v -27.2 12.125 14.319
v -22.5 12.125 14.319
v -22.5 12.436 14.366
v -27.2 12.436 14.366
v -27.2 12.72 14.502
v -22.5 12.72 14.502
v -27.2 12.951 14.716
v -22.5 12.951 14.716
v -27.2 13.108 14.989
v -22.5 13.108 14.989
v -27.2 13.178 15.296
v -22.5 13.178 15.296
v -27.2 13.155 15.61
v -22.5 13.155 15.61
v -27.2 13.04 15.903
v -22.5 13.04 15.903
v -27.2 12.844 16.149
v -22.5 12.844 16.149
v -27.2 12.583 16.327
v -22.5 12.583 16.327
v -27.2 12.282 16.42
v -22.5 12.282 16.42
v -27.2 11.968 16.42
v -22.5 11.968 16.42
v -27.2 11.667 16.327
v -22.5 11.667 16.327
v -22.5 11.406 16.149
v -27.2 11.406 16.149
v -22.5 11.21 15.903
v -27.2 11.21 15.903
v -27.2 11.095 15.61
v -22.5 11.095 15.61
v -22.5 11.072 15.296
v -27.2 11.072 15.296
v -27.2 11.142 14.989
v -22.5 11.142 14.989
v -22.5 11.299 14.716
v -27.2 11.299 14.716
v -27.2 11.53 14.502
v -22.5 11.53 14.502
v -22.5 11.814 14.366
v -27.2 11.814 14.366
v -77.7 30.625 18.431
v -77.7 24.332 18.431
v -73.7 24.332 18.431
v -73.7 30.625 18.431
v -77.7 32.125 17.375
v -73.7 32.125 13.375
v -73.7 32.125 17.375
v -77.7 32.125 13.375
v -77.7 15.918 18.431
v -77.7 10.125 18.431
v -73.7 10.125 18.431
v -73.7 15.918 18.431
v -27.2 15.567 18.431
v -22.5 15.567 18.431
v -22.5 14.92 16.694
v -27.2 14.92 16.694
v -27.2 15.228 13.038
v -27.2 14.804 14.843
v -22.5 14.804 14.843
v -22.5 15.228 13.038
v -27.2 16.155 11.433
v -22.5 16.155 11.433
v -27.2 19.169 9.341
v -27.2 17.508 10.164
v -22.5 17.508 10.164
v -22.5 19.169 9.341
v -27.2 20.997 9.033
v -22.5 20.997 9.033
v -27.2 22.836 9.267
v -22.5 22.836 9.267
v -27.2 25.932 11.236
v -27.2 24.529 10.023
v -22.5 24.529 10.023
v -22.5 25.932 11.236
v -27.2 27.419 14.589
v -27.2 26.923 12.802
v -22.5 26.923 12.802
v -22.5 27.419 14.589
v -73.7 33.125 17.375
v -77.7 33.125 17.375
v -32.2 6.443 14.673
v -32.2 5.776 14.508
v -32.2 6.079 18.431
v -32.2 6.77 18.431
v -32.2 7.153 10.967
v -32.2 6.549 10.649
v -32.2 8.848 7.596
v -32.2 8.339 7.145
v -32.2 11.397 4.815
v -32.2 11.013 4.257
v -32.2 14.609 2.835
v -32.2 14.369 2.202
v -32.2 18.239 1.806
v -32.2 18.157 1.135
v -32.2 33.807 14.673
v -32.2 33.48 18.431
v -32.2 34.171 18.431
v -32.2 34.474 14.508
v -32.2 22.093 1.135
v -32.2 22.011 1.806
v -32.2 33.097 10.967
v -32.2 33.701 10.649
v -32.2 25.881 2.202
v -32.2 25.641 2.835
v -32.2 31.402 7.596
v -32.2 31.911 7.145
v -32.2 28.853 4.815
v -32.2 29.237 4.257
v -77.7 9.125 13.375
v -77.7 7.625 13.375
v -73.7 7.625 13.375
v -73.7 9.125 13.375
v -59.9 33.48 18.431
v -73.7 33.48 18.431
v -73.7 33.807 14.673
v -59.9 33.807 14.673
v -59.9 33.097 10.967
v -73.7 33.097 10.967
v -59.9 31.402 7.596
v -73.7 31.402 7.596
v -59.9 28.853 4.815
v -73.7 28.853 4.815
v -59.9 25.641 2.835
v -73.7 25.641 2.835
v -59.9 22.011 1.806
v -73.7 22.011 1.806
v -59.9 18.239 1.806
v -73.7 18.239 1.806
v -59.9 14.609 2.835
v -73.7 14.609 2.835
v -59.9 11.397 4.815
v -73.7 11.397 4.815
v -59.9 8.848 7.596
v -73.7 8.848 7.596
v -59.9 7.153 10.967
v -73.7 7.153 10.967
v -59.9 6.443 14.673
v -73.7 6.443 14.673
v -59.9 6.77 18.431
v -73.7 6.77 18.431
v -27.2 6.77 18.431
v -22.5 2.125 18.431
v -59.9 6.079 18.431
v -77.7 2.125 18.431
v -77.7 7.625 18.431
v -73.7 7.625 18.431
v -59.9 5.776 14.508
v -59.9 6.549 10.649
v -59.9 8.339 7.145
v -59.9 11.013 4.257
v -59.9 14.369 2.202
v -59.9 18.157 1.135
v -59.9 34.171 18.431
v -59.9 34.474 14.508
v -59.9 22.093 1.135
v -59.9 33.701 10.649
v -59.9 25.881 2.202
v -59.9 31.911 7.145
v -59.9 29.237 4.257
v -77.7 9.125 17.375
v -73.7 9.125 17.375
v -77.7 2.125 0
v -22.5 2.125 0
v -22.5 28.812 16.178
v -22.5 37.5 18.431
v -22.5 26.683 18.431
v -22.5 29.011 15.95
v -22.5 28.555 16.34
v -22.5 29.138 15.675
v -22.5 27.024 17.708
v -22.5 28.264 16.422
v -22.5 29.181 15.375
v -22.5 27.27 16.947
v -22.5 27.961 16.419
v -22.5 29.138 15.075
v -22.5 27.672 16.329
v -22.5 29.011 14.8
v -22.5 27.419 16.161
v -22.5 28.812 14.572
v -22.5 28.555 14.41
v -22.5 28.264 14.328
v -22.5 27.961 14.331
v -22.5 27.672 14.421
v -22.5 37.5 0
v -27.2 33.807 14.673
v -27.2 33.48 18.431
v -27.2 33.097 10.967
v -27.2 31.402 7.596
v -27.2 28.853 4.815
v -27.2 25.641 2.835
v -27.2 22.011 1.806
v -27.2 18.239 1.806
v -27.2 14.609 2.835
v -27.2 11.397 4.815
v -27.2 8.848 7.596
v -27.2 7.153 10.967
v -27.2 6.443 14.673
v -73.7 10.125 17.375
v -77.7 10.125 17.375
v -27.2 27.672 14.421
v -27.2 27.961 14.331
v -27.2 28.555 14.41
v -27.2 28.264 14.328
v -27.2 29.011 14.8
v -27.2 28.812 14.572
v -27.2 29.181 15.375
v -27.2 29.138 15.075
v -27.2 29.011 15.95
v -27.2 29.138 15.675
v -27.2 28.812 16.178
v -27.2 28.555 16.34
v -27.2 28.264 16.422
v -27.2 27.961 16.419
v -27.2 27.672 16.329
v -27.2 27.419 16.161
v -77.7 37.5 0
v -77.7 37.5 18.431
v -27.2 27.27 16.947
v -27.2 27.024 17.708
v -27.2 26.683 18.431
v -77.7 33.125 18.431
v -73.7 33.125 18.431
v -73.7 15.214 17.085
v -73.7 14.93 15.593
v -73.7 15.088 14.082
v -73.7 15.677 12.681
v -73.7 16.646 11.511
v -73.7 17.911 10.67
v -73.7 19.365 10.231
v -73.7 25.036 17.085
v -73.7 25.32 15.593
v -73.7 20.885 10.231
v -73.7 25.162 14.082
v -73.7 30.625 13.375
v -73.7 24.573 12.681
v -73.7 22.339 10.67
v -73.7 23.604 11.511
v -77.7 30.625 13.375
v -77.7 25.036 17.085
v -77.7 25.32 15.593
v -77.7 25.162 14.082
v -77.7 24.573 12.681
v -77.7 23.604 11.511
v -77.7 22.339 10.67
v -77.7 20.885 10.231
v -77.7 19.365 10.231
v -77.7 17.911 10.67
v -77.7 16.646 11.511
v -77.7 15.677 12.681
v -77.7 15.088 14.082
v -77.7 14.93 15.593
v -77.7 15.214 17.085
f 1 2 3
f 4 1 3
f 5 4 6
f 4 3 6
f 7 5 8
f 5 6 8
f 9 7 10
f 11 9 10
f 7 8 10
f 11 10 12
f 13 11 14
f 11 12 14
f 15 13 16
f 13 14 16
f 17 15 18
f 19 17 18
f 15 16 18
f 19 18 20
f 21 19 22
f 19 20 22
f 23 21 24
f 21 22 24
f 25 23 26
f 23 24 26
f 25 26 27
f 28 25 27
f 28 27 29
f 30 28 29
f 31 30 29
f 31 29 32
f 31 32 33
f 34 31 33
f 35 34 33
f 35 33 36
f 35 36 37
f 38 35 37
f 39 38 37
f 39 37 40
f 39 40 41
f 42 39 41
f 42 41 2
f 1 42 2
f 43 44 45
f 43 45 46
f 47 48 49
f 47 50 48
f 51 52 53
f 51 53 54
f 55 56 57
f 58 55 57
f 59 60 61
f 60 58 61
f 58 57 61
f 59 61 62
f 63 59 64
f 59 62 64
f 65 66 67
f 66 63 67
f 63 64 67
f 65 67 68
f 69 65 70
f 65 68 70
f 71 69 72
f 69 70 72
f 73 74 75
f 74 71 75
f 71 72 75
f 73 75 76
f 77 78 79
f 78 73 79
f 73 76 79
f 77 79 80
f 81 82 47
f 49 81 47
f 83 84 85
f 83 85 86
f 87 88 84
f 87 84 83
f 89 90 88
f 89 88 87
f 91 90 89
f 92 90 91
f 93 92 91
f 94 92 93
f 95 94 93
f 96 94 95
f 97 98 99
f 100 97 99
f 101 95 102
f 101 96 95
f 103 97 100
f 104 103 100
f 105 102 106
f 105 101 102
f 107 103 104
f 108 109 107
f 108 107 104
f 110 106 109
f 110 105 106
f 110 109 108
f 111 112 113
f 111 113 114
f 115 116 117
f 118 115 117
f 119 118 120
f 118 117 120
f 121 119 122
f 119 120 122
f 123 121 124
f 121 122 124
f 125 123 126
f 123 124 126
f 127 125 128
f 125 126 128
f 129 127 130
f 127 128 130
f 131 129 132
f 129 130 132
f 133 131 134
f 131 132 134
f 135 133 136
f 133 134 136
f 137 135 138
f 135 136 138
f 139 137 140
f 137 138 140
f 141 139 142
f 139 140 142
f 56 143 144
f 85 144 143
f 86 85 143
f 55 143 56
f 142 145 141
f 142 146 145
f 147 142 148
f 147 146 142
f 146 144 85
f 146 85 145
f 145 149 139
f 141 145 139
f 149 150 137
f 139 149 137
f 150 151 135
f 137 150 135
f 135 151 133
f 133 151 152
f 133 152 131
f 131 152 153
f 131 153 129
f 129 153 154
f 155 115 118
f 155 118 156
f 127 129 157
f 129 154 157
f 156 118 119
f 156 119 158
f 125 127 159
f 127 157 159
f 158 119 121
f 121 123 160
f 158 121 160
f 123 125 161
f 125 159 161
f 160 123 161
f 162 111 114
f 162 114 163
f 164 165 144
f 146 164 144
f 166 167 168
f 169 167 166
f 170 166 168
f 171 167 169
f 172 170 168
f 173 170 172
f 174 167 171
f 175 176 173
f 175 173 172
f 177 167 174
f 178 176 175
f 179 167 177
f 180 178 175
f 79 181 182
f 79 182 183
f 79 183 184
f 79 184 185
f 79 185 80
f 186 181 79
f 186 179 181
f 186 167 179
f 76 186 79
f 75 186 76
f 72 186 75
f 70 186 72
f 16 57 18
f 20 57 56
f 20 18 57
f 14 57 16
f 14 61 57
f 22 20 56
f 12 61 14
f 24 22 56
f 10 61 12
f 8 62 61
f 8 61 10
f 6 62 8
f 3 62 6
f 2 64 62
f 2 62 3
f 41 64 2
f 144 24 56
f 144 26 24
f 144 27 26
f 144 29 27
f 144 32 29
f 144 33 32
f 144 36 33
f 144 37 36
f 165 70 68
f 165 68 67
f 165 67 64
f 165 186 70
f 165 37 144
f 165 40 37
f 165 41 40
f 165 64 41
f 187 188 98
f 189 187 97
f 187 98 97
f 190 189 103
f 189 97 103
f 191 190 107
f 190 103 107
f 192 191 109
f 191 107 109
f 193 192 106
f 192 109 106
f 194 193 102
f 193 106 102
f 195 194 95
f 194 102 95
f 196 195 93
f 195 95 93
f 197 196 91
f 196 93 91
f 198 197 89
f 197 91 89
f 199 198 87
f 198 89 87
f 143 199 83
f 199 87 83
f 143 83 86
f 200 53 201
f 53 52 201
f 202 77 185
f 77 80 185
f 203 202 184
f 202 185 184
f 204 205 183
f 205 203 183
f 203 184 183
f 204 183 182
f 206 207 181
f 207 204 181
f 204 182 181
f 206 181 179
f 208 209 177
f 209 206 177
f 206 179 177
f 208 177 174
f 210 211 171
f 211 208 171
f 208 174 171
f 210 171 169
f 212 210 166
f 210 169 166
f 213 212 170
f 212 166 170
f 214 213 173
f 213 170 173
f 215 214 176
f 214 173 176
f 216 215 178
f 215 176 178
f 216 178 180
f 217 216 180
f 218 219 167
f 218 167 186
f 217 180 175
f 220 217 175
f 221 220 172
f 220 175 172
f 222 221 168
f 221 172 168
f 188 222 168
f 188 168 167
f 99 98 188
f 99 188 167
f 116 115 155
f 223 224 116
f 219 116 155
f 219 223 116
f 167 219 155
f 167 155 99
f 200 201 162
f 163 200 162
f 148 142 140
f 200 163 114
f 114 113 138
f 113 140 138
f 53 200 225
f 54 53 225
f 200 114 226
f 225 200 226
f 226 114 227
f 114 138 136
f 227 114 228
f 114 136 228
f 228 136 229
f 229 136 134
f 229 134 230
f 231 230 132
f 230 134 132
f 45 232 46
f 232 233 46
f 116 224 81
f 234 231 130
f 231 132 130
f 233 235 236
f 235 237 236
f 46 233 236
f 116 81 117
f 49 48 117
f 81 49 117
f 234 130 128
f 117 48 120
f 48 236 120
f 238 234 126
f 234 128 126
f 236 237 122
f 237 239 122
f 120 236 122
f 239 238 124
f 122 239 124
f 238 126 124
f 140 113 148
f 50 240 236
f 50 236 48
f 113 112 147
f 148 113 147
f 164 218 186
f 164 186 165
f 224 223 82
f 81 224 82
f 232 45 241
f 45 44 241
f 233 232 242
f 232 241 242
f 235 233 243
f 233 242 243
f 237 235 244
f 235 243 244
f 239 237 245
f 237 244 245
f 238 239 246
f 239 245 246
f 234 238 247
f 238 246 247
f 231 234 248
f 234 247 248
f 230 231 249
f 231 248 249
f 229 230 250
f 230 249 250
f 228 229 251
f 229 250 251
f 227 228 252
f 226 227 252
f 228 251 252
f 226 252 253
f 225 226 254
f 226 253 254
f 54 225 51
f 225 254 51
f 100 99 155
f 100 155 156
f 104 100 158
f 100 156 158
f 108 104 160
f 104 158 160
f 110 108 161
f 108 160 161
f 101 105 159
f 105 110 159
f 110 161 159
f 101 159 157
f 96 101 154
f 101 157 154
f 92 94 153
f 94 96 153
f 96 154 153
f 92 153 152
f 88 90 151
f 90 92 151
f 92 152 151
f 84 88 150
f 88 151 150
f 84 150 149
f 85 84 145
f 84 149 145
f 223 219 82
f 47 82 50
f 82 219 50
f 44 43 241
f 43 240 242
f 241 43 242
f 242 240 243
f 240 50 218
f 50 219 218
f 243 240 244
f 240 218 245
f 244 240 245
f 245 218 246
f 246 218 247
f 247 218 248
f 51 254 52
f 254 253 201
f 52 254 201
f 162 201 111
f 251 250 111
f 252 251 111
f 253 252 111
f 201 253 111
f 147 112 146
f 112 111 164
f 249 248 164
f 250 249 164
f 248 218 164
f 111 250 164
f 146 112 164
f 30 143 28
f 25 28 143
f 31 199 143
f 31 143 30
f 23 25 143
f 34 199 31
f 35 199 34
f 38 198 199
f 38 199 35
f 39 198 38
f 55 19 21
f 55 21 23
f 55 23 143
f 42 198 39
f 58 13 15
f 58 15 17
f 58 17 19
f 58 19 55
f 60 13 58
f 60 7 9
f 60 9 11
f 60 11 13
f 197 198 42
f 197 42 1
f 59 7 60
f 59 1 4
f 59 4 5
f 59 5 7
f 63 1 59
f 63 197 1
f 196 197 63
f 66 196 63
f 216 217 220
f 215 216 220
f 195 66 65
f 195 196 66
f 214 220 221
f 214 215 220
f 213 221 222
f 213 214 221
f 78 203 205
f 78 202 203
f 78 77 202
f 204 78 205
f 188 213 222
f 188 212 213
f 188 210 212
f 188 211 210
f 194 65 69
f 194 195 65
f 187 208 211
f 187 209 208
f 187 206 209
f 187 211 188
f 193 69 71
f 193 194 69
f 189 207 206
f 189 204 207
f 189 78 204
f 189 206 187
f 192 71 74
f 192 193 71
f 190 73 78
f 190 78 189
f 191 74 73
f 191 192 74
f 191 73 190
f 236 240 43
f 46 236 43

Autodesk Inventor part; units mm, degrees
ref_plane "Work Plane1" through (-24.5, 21.125, 15.375) normal (1, 0, 0) x (0, -1, 0)
sketch "Sketch1" plane through (-24.5, 21.125, 15.375) normal (1, 0, 0) x (0, -1, 0)
  line L0 (-16.375, 15.375) -> (19, 15.375)
  line L1 (19, 15.375) -> (19, -3.0564)
  line L2 (19, -3.0564) -> (-16.375, -3.0564)
  line L3 (-16.375, -3.0564) -> (-16.375, 15.375)
  circle A0 centre (1, 0) radius 5 projected
  circle A1 centre (9, 0) radius 1.0564 projected
  circle A2 centre (-7, 0) radius 1.0564 projected
  circle A3 centre (1, 0) radius 5 projected
  circle A4 centre (1, 0) radius 13.7 projected
  line L4 (93.625, 18.375) -> (-16.375, 18.375) projected
  line L5 (-16.375, 18.375) -> (-16.375, 15.375) projected
  line L6 (93.625, 15.375) -> (-16.375, 15.375) projected
  line L7 (93.625, 18.375) -> (93.625, 15.375) projected
  point P0 (21.125, 15.375)
  point P1 (9, -1.0564)
  dimension "d5" = 2.1129
  dimension "d0" = 2
  dimension "d2" = 17.375
  dimension "d3" = 18
  dimension "d6" = 1.0564
extrude "Extrusion1" add sketch "Sketch1" along normal blind 2 and the other way blind 53.2 contours L0 L1 L2 A4 L3 | A4 L2 A0 | A0 L2 | A1 | A2 picked at (8.3146, 4.455) picked at (0.6453, -0.039)
sketch "Sketch2" plane through (-77.7, 21.125, 15.375) normal (-1, 0, 0) x (0, 0, 1)
  circle A0 centre (0, -1) radius 5 projected
  line L0 (-1.5, 10) -> (1.5, 10) projected
  line L1 (1.5, 10) -> (1.5, 10.5) projected
  line L2 (1.5, 10.5) -> (-1.5, 10.5) projected
  line L3 (-1.5, 10.5) -> (-1.5, 10) projected
  line L4 (1.5, -12.5) -> (-1.5, -12.5) projected
  line L5 (-1.5, -12.5) -> (-1.5, -13) projected
  line L6 (-1.5, -13) -> (1.5, -13) projected
  line L7 (1.5, -13) -> (1.5, -12.5) projected
  line L8 (2, 9.5) -> (-2, 9.5)
  line L9 (-2, 9.5) -> (-2, 11)
  line L10 (-2, 11) -> (2, 11)
  line L11 (2, 11) -> (2, 9.5)
  line L12 (2, -13.5) -> (-2, -13.5)
  line L13 (-2, -13.5) -> (-2, -12)
  line L14 (-2, -12) -> (2, -12)
  line L15 (2, -12) -> (2, -13.5)
  circle A1 centre (0, -1) radius 5.2
  line L16 (3.0564, 16.375) -> (3.0564, -19) projected
  line L17 (2, 9.5) -> (3.0564, 9.5)
  line L18 (3.0564, 9.5) -> (3.0564, 12)
  line L19 (3.0564, 12) -> (2, 12)
  line L20 (2, 12) -> (2, 9.5)
  line L21 (2, -13.5) -> (3.0564, -13.5)
  line L22 (3.0564, -13.5) -> (3.0564, -11)
  line L23 (3.0564, -11) -> (2, -11)
  line L24 (2, -11) -> (2, -13.5)
  point P0 (-15.375, -21.125)
  point P1 (2, -11)
  point P2 (3.0564, -13.5)
  point P3 (3.0564, -11)
  point P4 (2, 12)
  point P5 (3.0564, 9.5)
  dimension "d11" = 0.5
  dimension "d12" = 0.5
  dimension "d13" = 0.2
ref_plane "Work Plane2" through (-73.7, 7.425, 1.675) normal (-1, 0, 0) x (0, 0, 1)
extrude "Extrusion2" cut sketch "Sketch2" against normal up to surface (4 mm away) contours A0 L16 | A0 L16 A1 | L16 A0 | A0 L16 A1 | L16 L21 L15 L24 L23 | L17 L11 L20 L19 L16 | L8 L9 L10 L11 | L12 L13 L14 L15 | L3 L2 L1 L0 | L7 L6 L5 L4
ref_plane "Work Plane3" through (-73.7, 21.125, 15.375) normal (-1, 0, 0) x (0, 1, 0)
sketch "Sketch3" plane through (-73.7, 21.125, 15.375) normal (-1, 0, 0) x (0, 1, 0)
  line L0 (10, 1.5) -> (10.5, 1.5) projected
  line L1 (10.5, 1.5) -> (10.5, -1.5) projected
  line L2 (10.5, -1.5) -> (10, -1.5) projected
  line L3 (10, -1.5) -> (10, 1.5) projected
  line L4 (-12.5, -1.5) -> (-13, -1.5) projected
  line L5 (-13, -1.5) -> (-13, 1.5) projected
  line L6 (-13, 1.5) -> (-12.5, 1.5) projected
  line L7 (-12.5, 1.5) -> (-12.5, -1.5) projected
  circle A0 centre (-1, 0) radius 5 projected
  circle A1 centre (-1, 0) radius 13.7 projected
  point P0 (-21.125, 15.375)
ref_plane "Work Plane4" through (-27.2, 7.425, 1.675) normal (1, 0, 0) x (0, 1, 0)
extrude "Extrusion3" cut sketch "Sketch3" against normal up to surface (46.5 mm away) contours L0 L1 L2 L3 | L4 L5 L6 L7 | A0 | A1
ref_plane "Work Plane5" through (-59.9, 21.125, 15.375) normal (-1, 0, 0) x (0, 1, 0)
sketch "Sketch4" plane through (-59.9, 21.125, 15.375) normal (-1, 0, 0) x (0, 1, 0)
  circle A0 centre (-1, 0) radius 14.375 projected
  point P0 (-21.125, 15.375)
ref_plane "Work Plane6" through (-32.2, 6.75, 1) normal (1, 0, 0) x (0, 1, 0)
extrude "Extrusion4" cut sketch "Sketch4" against normal up to surface (27.7 mm away)
sketch "Sketch5" plane through (-22.5, 21.125, 15.375) normal (1, 0, 0) x (0, 0, -1)
  circle A0 centre (0, -9) radius 1.0564 projected
  circle A1 centre (0, 7) radius 1.0564 projected
  arc A2 (5.1468, 2.7666) -> (3.0755, 2.3394) centre (5.0543, -2.0206) ccw projected
  arc A3 (3.0755, 2.3394) -> (2.6716, 2.7917) centre (0, 0) ccw projected
  arc A4 (2.6716, 2.7917) -> (3.3299, 4.8016) centre (-1.4371, 5.2501) ccw projected
  arc A5 (3.3299, 4.8016) -> (2.5377, 5.2634) centre (0, 0) ccw projected
  arc A6 (2.5377, 5.2634) -> (1.113, 3.7003) centre (5.2767, 1.3362) ccw projected
  arc A7 (1.113, 3.7003) -> (0.5205, 3.8289) centre (0, 0) ccw projected
  arc A8 (0.5205, 3.8289) -> (-0.1284, 5.8419) centre (-4.2486, 3.4027) ccw projected
  arc A9 (-0.1284, 5.8419) -> (-1.0407, 5.7498) centre (0, 0) ccw projected
  arc A10 (-1.0407, 5.7498) -> (-1.2746, 3.6479) centre (3.4835, 4.1825) ccw projected
  arc A11 (-1.2746, 3.6479) -> (-1.8295, 3.4036) centre (0, 0) ccw projected
  arc A12 (-1.8295, 3.4036) -> (-3.5377, 4.6507) centre (-5.4372, 0.2556) ccw projected
  arc A13 (-3.5377, 4.6507) -> (-4.2216, 4.04) centre (0, 0) ccw projected
  arc A14 (-4.2216, 4.04) -> (-3.1753, 2.202) centre (0.3598, 5.4313) ccw projected
  arc A15 (-3.1753, 2.202) -> (-3.4807, 1.6782) centre (0, 0) ccw projected
  arc A16 (-3.4807, 1.6782) -> (-5.5956, 1.6831) centre (-4.549, -2.9892) ccw projected
  arc A17 (-5.5956, 1.6831) -> (-5.79, 0.787) centre (0, 0) ccw projected
  arc A18 (-5.79, 0.787) -> (-3.8632, -0.0849) centre (-2.9013, 4.6055) ccw projected
  arc A19 (-3.8632, -0.0849) -> (-3.8023, -0.6882) centre (0, 0) ccw projected
  arc A20 (-3.8023, -0.6882) -> (-5.5163, -1.9274) centre (-1.9232, -5.0921) ccw projected
  arc A21 (-5.5163, -1.9274) -> (-5.1468, -2.7666) centre (0, 0) ccw projected
  arc A22 (-5.1468, -2.7666) -> (-3.0755, -2.3394) centre (-5.0543, 2.0206) ccw projected
  arc A23 (-3.0755, -2.3394) -> (-2.6716, -2.7917) centre (0, 0) ccw projected
  arc A24 (-2.6716, -2.7917) -> (-3.3299, -4.8016) centre (1.4371, -5.2501) ccw projected
  arc A25 (-3.3299, -4.8016) -> (-2.5377, -5.2634) centre (0, 0) ccw projected
  arc A26 (-2.5377, -5.2634) -> (-1.113, -3.7003) centre (-5.2767, -1.3362) ccw projected
  arc A27 (-1.113, -3.7003) -> (-0.5205, -3.8289) centre (0, 0) ccw projected
  arc A28 (-0.5205, -3.8289) -> (0.1284, -5.8419) centre (4.2486, -3.4027) ccw projected
  arc A29 (0.1284, -5.8419) -> (1.0407, -5.7498) centre (0, 0) ccw projected
  arc A30 (1.0407, -5.7498) -> (1.2746, -3.6479) centre (-3.4835, -4.1825) ccw projected
  arc A31 (1.2746, -3.6479) -> (1.8295, -3.4036) centre (0, 0) ccw projected
  arc A32 (1.8295, -3.4036) -> (3.5377, -4.6507) centre (5.4372, -0.2556) ccw projected
  arc A33 (3.5377, -4.6507) -> (4.2216, -4.04) centre (0, 0) ccw projected
  arc A34 (4.2216, -4.04) -> (3.1753, -2.202) centre (-0.3598, -5.4313) ccw projected
  arc A35 (3.1753, -2.202) -> (3.4807, -1.6782) centre (0, 0) ccw projected
  arc A36 (3.4807, -1.6782) -> (5.5956, -1.6831) centre (4.549, 2.9892) ccw projected
  arc A37 (5.5956, -1.6831) -> (5.79, -0.787) centre (0, 0) ccw projected
  arc A38 (5.79, -0.787) -> (3.8632, 0.0849) centre (2.9013, -4.6055) ccw projected
  arc A39 (3.8632, 0.0849) -> (3.8023, 0.6882) centre (0, 0) ccw projected
  arc A40 (3.8023, 0.6882) -> (5.5163, 1.9274) centre (1.9232, 5.0921) ccw projected
  arc A41 (5.5163, 1.9274) -> (5.1468, 2.7666) centre (0, 0) ccw projected
  circle A42 centre (0, 0) radius 5.8433
  circle A43 centre (0, 0) radius 6.3433
  point P0 (15.375, -21.125)
  dimension "d20" = 0.5
extrude "Extrusion5" cut sketch "Sketch5" along normal mid plane 10 contours A0 | A1 A43 | A43 A1 | A1 A43 | A41 A40 A39 A38 A37 A36 A35 A34 A33 A32 A31 A30 A29 A28 A27 A26 A25 A24 A23 A22 A21 A20 A19 A18 A17 A16 A15 A14 A13 A12 A11 A10 A9 A8 A7 A6 A5 A4 A3 A2 | A2 A3 A4 A42 | A42 A38 A39 A40 | A6 A7 A8 A42 | A42 A34 A35 A36 | A10 A11 A12 A42 | A42 A30 A31 A32 | A14 A15 A16 A42 | A42 A26 A27 A28 | A18 A19 A20 A42 | A42 A22 A23 A24
sketch "Sketch6" plane through (-77.7, 37.5, 18.4314) normal (0, 0, 1) x (1, 0, 0)
  line L0 (50.5, -10.8166) -> (55.2, -10.8166) projected
  line L1 (55.2, 0) -> (55.2, -10.8166) projected
  line L2 (0, 0) -> (55.2, 0) projected
  line L3 (0, -4.375) -> (0, 0) projected
  line L4 (0, -4.375) -> (4, -4.375) projected
  line L5 (4, -30.7297) -> (4, -29.875) projected
  line L6 (4, -4.0203) -> (17.8, -4.0203) projected
  line L7 (17.8, -4.0203) -> (17.8, -3.3287) projected
  line L8 (17.8, -3.3287) -> (45.5, -3.3287) projected
  line L9 (45.5, -3.3287) -> (45.5, -4.0203) projected
  line L10 (45.5, -4.0203) -> (50.5, -4.0203) projected
  line L11 (50.5, -4.0203) -> (50.5, -10.8166) projected
  line L12 (55.2, -21.9334) -> (50.5, -21.9334) projected
  line L13 (50.5, -21.9334) -> (50.5, -30.7297) projected
  line L14 (50.5, -30.7297) -> (45.5, -30.7297) projected
  line L15 (45.5, -30.7297) -> (45.5, -31.4213) projected
  line L16 (45.5, -31.4213) -> (17.8, -31.4213) projected
  line L17 (17.8, -31.4213) -> (17.8, -30.7297) projected
  line L18 (4, -30.7297) -> (4, -29.875) projected
  line L19 (4, -29.875) -> (0, -29.875) projected
  line L20 (0, -35.375) -> (0, -29.875) projected
  line L21 (55.2, -35.375) -> (0, -35.375) projected
  line L22 (55.2, -21.9334) -> (55.2, -35.375) projected
  line L23 (50.5, -10.8166) -> (55.2, -10.8166) projected
  line L24 (55.2, 0) -> (55.2, -10.8166) projected
  line L25 (0, 0) -> (55.2, 0) projected
  line L26 (0, -4.375) -> (0, 0) projected
  line L27 (0, -4.375) -> (4, -4.375) projected
  line L28 (4, -4.375) -> (4, -4.0203) projected
  line L29 (4, -4.0203) -> (17.8, -4.0203) projected
  line L30 (45.5, -4.0203) -> (50.5, -4.0203) projected
  line L31 (50.5, -4.0203) -> (50.5, -10.8166) projected
  line L32 (17.8, -4.0203) -> (17.8, -3.3287) projected
  line L33 (17.8, -3.3287) -> (45.5, -3.3287) projected
  line L34 (45.5, -3.3287) -> (45.5, -4.0203) projected
  line L35 (17.8, -30.7297) -> (4, -30.7297) projected
  line L36 (4, -27.375) -> (4, -21.5819) projected
  line L37 (4, -21.5819) -> (0, -21.5819) projected
  line L38 (0, -27.375) -> (0, -21.5819) projected
  line L39 (0, -27.375) -> (4, -27.375) projected
  line L40 (4, -13.1681) -> (4, -6.875) projected
  line L41 (4, -6.875) -> (0, -6.875) projected
  line L42 (0, -13.1681) -> (0, -6.875) projected
  line L43 (0, -13.1681) -> (4, -13.1681) projected
  line L44 (4, -27.375) -> (4, -21.5819) projected
  line L45 (4, -21.5819) -> (0, -21.5819) projected
  line L46 (0, -27.375) -> (0, -21.5819) projected
  line L47 (0, -27.375) -> (4, -27.375) projected
  line L48 (4, -13.1681) -> (4, -6.875) projected
  line L49 (4, -6.875) -> (0, -6.875) projected
  line L50 (0, -13.1681) -> (0, -6.875) projected
  line L51 (0, -13.1681) -> (4, -13.1681) projected
  line L52 (55.2, -21.9334) -> (50.5, -21.9334) projected
  line L53 (50.5, -21.9334) -> (50.5, -30.7297) projected
  line L54 (50.5, -30.7297) -> (45.5, -30.7297) projected
  line L55 (45.5, -30.7297) -> (45.5, -31.4213) projected
  line L56 (45.5, -31.4213) -> (17.8, -31.4213) projected
  line L57 (17.8, -31.4213) -> (17.8, -30.7297) projected
  line L58 (17.8, -30.7297) -> (4, -30.7297) projected
  line L59 (4, -29.875) -> (0, -29.875) projected
  line L60 (0, -35.375) -> (0, -29.875) projected
  line L61 (55.2, -35.375) -> (0, -35.375) projected
  line L62 (55.2, -21.9334) -> (55.2, -35.375) projected
  line L63 (4, -4.375) -> (4, -4.0203) projected
  point P0 (77.7, -37.5)
  point P1 (2, -2)
  point P2 (53.2, -2)
  point P3 (53.2, -33.375)
  point P4 (2, -33.375)
  dimension "d23" = 2
  dimension "d24" = 2
  dimension "d25" = 2
  dimension "d26" = 2
  dimension "d27" = 2
  dimension "d28" = 2
  dimension "d29" = 2
  dimension "d30" = 2
equation "\"d6\" = 0.5 * d5"
properties part number "right_motor_mount"
